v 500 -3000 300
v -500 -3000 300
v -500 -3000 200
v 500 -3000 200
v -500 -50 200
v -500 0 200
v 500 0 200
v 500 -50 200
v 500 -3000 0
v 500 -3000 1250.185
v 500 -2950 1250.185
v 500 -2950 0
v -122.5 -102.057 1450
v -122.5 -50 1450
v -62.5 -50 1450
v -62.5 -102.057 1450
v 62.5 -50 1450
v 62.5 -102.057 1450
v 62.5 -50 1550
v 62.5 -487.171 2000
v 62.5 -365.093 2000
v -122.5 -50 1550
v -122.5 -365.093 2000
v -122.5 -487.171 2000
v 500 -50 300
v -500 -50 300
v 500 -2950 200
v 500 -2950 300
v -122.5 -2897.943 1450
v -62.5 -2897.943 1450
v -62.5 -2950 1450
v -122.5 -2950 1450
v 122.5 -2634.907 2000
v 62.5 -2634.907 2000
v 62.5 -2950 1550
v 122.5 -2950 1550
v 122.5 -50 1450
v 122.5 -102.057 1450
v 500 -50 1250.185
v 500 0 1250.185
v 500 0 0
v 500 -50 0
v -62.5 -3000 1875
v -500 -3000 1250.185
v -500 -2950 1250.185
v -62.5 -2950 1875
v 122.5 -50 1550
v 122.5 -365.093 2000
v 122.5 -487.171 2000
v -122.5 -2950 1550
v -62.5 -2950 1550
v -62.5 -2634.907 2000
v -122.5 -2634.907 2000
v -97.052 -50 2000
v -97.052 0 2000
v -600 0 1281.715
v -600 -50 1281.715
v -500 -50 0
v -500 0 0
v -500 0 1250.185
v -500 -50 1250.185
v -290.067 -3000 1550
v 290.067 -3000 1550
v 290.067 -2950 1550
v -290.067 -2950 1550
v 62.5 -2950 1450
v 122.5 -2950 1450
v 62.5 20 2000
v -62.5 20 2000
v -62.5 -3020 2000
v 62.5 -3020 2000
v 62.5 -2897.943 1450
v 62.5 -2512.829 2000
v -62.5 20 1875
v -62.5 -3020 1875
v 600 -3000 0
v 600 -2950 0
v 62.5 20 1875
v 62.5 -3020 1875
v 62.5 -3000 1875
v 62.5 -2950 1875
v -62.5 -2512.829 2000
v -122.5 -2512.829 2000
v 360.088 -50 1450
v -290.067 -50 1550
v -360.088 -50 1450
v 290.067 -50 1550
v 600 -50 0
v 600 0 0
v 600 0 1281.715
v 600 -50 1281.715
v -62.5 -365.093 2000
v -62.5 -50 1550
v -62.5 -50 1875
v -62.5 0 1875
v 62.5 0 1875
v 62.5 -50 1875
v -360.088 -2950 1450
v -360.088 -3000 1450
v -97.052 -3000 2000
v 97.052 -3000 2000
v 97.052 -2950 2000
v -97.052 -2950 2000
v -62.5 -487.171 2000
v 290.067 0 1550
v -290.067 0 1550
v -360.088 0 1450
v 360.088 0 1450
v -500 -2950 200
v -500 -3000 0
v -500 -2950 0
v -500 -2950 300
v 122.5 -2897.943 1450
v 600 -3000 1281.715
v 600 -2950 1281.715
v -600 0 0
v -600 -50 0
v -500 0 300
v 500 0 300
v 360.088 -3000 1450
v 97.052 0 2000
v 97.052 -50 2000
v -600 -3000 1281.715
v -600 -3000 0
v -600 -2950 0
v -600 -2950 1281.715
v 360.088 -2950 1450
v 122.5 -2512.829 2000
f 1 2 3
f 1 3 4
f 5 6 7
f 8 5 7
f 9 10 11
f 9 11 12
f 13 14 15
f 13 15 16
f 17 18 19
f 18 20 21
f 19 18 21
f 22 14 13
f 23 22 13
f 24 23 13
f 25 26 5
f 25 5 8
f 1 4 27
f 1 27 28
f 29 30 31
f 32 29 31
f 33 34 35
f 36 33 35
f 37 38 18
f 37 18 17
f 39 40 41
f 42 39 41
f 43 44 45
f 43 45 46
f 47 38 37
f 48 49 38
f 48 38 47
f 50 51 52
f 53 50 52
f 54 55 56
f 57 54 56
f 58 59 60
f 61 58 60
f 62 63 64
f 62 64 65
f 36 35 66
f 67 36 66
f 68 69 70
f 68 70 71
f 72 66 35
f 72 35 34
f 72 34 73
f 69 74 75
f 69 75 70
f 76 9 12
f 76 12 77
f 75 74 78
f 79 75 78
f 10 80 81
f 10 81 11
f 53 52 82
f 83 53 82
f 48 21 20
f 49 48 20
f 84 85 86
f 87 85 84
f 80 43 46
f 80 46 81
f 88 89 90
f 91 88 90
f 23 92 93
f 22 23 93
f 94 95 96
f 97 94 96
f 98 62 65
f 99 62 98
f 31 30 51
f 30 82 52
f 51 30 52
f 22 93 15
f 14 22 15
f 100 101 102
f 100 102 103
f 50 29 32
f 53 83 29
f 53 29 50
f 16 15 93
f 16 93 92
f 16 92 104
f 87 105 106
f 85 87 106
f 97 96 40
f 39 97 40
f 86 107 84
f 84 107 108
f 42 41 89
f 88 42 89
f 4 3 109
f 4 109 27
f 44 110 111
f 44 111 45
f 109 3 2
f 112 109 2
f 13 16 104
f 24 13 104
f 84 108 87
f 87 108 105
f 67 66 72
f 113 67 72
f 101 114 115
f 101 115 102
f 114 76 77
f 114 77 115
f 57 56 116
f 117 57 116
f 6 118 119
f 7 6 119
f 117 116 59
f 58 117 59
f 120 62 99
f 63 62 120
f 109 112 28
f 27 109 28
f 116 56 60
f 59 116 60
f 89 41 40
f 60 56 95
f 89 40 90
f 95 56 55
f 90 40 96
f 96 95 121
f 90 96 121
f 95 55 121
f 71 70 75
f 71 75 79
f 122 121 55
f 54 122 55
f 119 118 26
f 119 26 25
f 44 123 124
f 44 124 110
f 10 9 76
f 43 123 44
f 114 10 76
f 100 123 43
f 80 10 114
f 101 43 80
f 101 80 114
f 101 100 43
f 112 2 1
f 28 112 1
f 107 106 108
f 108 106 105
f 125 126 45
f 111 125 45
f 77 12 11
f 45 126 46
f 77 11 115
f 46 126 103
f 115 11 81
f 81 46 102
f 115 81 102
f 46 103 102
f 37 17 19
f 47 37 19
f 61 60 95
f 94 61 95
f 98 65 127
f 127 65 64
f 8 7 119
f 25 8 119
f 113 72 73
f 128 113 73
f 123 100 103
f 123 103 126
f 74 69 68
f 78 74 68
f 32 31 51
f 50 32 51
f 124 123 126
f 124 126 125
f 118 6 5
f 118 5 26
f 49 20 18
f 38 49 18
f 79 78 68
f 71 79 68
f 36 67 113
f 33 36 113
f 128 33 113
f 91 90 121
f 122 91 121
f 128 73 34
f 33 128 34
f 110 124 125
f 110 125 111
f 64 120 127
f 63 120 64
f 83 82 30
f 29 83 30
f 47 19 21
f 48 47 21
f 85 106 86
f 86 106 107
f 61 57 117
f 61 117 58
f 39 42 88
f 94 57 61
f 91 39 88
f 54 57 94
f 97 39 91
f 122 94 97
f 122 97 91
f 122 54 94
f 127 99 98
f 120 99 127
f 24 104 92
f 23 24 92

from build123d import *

# Parameters (mm, degrees)
F1_DEPTH      = 50
F4_DEPTH      = 50
F5_W          = 125
F5_H          = 125
F6_DEPTH      = 3020
F6_DEPTH_BACK = 20
F7_W          = 1000
F7_H          = 100
F8_DEPTH      = 50
F9_W          = 1000
F9_H          = 100
F10_DEPTH     = 50
F12_DEPTH     = 60
F14_DEPTH     = 60


with BuildPart() as f1:
    # F0 (on Front) → F1 (new body)
    with BuildSketch(Plane.XZ):
        Polygon((0, 2000), (-97.051517, 2000), (-600, 1281.715126), (-600, 0), (-500, 0), (-500, 1250.185247), (-62.5, 1875), (0, 1875), (62.5, 1875), (500, 1250.185247), (500, 0), (600, 0), (600, 1281.715126), (97.051517, 2000), align=None)
    extrude(amount=F1_DEPTH)


with BuildPart() as f4:
    # F3 (on offset) → F4 (new body)
    with BuildSketch(Plane.XZ.offset(3000)):
        Polygon((-500, 1250.185247), (-62.5, 1875), (62.5, 1875), (500, 1250.185247), (500, 0), (600, 0), (600, 1281.715126), (97.051517, 2000), (-97.051517, 2000), (-600, 1281.715126), (-600, 0), (-500, 0), align=None)
    extrude(amount=-F4_DEPTH)


with BuildPart() as f6:
    # F5 (on Front) → F6 (new body, two sides)
    with BuildSketch(Plane.XZ) as f6_sk:
        with Locations((0, 1937.5)):
            Rectangle(F5_W, F5_H)
    extrude(amount=F6_DEPTH)
    extrude(f6_sk.sketch, amount=-F6_DEPTH_BACK)


with BuildPart() as f8:
    # F7 (on offset) → F8 (new body)
    with BuildSketch(Plane.XZ.offset(3000)):
        Polygon((-290.06745, 1550), (-360.088204, 1450), (360.088204, 1450), (290.06745, 1550), align=None)
        with Locations((0, 250)):
            Rectangle(F7_W, F7_H)
    extrude(amount=-F8_DEPTH)


with BuildPart() as f10:
    # F9 (on Front) → F10 (new body)
    with BuildSketch(Plane.XZ):
        with Locations((0, 250)):
            Rectangle(F9_W, F9_H)
        Polygon((360.088204, 1450), (290.06745, 1550), (-290.06745, 1550), (-360.088204, 1450), align=None)
    extrude(amount=F10_DEPTH)


with BuildPart() as f12:
    # F11 (on face) → F12 (new body)
    with BuildSketch(Plane.YZ.offset(62.5)):
        Polygon((-2634.906608, 2000), (-2950, 1550), (-2950, 1450), (-2897.943295, 1450), (-2512.829149, 2000), align=None)
        Polygon((-50, 1550), (-365.093392, 2000), (-487.170851, 2000), (-102.056705, 1450), (-50, 1450), align=None)
    extrude(amount=F12_DEPTH)


with BuildPart() as f14:
    # F13 (on face) → F14 (new body)
    with BuildSketch(Plane(origin=(-62.5, 0, 0), x_dir=(0, -1, 0), z_dir=(-1, 0, 0))):
        Polygon((50, 1550), (50, 1450), (102.056705, 1450), (487.170851, 2000), (365.093392, 2000), align=None)
        Polygon((2512.829149, 2000), (2897.943295, 1450), (2950, 1450), (2950, 1550), (2634.906608, 2000), align=None)
    extrude(amount=F14_DEPTH)


solid = Compound([f1.part, f4.part, f6.part, f8.part, f10.part, f12.part, f14.part])
